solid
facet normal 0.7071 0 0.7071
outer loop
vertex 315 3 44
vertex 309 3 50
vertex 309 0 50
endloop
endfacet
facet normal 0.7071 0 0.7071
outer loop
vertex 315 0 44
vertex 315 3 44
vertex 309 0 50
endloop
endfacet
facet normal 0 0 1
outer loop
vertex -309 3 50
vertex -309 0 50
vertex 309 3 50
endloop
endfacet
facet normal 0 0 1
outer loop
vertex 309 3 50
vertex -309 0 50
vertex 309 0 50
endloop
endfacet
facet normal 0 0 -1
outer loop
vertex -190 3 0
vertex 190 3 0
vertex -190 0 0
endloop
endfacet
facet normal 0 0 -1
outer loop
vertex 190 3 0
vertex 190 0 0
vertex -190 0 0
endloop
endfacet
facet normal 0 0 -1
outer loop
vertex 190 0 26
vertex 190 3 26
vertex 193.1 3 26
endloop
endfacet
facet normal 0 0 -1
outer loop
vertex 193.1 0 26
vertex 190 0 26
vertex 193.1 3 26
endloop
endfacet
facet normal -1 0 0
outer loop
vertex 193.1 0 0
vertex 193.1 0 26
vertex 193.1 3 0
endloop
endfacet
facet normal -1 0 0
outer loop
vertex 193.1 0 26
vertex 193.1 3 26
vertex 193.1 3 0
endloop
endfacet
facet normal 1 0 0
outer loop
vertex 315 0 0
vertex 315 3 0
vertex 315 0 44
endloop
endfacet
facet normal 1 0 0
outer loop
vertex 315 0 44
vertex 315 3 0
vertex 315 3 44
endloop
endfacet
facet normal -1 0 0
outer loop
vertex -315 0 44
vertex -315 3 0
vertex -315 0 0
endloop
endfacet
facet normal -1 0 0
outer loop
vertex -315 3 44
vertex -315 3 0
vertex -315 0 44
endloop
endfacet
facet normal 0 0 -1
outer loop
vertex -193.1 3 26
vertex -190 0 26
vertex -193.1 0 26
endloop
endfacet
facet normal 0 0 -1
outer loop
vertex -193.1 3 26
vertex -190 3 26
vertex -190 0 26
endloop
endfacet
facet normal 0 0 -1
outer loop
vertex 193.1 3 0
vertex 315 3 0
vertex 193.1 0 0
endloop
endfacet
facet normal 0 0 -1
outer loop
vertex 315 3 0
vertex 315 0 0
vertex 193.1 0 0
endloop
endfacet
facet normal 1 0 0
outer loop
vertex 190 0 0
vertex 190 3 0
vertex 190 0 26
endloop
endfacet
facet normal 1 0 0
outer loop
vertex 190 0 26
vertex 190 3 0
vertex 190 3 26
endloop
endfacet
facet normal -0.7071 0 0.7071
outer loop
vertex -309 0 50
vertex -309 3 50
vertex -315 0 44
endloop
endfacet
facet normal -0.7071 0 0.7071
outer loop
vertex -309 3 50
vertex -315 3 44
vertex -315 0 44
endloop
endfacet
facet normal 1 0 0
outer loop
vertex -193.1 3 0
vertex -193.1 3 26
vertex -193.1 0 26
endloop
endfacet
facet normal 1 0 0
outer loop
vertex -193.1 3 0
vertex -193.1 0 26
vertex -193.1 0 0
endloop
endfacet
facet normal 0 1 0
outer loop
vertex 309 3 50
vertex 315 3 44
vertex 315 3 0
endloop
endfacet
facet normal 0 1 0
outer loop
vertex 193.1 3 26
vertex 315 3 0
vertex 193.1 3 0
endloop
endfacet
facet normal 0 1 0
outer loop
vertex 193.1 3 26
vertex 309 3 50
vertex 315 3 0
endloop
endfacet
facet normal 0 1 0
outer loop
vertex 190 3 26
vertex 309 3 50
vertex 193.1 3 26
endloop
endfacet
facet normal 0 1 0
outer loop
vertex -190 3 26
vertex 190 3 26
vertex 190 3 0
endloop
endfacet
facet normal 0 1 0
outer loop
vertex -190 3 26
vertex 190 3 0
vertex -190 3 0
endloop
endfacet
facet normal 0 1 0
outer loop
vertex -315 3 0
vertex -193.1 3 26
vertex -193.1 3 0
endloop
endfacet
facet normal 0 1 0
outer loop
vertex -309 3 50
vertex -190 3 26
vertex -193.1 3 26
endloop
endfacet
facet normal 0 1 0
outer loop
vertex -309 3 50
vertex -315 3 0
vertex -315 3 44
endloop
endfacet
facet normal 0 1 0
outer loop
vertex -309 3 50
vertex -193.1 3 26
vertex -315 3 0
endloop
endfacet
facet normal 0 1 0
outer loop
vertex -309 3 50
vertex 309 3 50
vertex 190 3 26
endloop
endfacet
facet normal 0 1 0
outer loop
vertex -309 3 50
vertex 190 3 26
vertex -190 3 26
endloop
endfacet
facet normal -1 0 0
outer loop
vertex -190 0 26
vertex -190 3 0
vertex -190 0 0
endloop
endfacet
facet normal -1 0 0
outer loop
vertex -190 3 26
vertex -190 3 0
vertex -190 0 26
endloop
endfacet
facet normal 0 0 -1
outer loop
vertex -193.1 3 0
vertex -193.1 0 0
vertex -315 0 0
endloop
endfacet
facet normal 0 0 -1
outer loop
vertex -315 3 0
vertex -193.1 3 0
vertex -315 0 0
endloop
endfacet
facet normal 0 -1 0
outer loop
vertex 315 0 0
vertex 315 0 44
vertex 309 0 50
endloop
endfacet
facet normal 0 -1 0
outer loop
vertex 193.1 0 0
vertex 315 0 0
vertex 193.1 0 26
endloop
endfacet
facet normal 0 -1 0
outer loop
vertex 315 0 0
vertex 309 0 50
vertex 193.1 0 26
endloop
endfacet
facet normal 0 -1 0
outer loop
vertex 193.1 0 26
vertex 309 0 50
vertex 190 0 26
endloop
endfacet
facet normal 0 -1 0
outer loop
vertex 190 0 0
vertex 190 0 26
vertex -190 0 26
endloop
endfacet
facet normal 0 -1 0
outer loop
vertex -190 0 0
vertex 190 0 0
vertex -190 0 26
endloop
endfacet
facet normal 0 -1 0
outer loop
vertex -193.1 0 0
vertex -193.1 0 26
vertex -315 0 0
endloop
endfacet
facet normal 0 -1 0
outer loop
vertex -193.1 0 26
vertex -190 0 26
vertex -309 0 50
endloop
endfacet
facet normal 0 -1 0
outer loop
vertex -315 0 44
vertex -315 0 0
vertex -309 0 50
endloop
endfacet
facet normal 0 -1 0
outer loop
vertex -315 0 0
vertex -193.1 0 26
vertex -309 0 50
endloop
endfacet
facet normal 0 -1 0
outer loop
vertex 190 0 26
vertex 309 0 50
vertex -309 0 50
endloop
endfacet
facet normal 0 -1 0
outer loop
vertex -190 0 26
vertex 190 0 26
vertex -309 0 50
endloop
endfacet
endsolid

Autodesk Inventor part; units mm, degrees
ref_plane "YZ Plane" through (0, 0, 0) normal (1, 0, 0) x (0, 1, 0)
ref_plane "XZ Plane" through (0, 0, 0) normal (0, 1, 0) x (-1, 0, 0)
ref_plane "XY Plane" through (0, 0, 0) normal (0, 0, 1) x (1, 0, 0)
sketch "Sketch2" plane through (0, 0, 0) normal (0, 1, 0) x (-1, 0, 0)
  line L0 (375, 50) -> (-375, 50)
  line L1 (-375, 50) -> (-375, 0)
  line L2 (-375, 0) -> (375, 0)
  line L3 (375, 0) -> (375, 50)
  circle A0 centre (-375, 0) radius 22.5
  circle A1 centre (375, 0) radius 22.5
  point P0 (0, 0)
  point P1 (0, 0)
  point P2 (-375, 22.5)
  point P3 (-352.5, 0)
  point P4 (352.5, 0)
  point P5 (375, 22.5)
  dimension "d18" = 750
  dimension "d19" = 50
  dimension "d20" = 45
extrude "Plate2" add sketch "Sketch2" along normal blind 3 contours L3 A1 L2 A0 L1 L0 | L3 L2 A1 | A0 L2 L1 picked at (360.188, 1.6689) picked at (-360.9308, 4.923)
sketch "Sketch3" plane through (0, 3, 0) normal (0, 1, 0) x (1, 0, 0)
  line L0 (-191.55, 0) -> (-191.55, -50) construction
  line L1 (-375, -50) -> (375, -50) construction
  line L2 (-375, -50) -> (-375, 0) projected
  line L3 (-193.1, 0) -> (-190, 0)
  line L4 (-190, 0) -> (-190, -26)
  line L5 (-190, -26) -> (-193.1, -26)
  line L6 (-193.1, -26) -> (-193.1, 0)
  line L7 (-375, 0) -> (375, 0) projected
  line L8 (375, 0) -> (-375, 0) projected
  line L9 (191.55, 0) -> (191.55, -50) construction
  line L10 (190, -26) -> (193.1, -26)
  line L11 (193.1, -26) -> (193.1, 0)
  line L12 (193.1, 0) -> (190, 0)
  line L13 (190, 0) -> (190, -26)
  line L14 (0, 0) -> (0, -50) construction
  point P0 (0, 0)
  point P1 (0, 0)
  point P2 (190, 0)
  point P3 (193.1, 0)
  dimension "d24" = 26
  dimension "d44" = 3.1
  dimension "d45" = 380
extrude "Extrusion1" cut sketch "Sketch3" against normal through all
sketch "Sketch4" plane through (0, 3, 0) normal (0, 1, 0) x (1, 0, 0)
  line L0 (-190, 0) -> (-190, -26) projected
  line L1 (-190, -26) -> (-193.1, -26) projected
  line L2 (-193.1, -26) -> (-193.1, 0) projected
  line L3 (-375, 0) -> (-193.1, 0) projected
  line L4 (-375, -50) -> (-375, 0) projected
  line L5 (375, -50) -> (-375, -50) projected
  line L6 (375, 0) -> (375, -50) projected
  line L7 (193.1, 0) -> (375, 0) projected
  line L8 (190, -26) -> (190, 0) projected
  line L9 (193.1, -26) -> (190, -26) projected
  line L10 (193.1, 0) -> (193.1, -26) projected
  line L11 (-190, 0) -> (190, 0) projected
  line L12 (-193.1, 0) -> (-375, 0) projected
  line L13 (-315, 0) -> (-315, -50)
  line L14 (315, 0) -> (315, -50)
  line L15 (-375, -50) -> (375, -50) projected
  point P0 (0, 0)
  dimension "d35" = 60
  dimension "d36" = 60
extrude "Extrusion2" cut sketch "Sketch4" against normal through all contours L13 L5 L4 L3 | L7 L6 L5 L14
sketch "Sketch5" plane through (0, 0, 0) normal (0, -1, 0) x (1, 0, 0)
  line L0 (-57.747, 1.3029) -> (-57.747, 31.8939) construction
  line L1 (-57.747, 31.8939) -> (64.2813, 31.8939) construction
  line L2 (64.2813, 31.8939) -> (64.2813, 1.3029) construction
  line L3 (64.2813, 1.3029) -> (-57.747, 1.3029) construction
  point P0 (0, 0)
mark "Mark1"
chamfer "Corner Chamfer1" distance 6 angle 45 2 edges at (-315, 1.5, 50) (315, 1.5, 50)
equation "\"d36\" = d35"
equation "\"d21\" = Thickness"
equation "\"BendReliefWidth\" = Thickness"
equation "\"BendReliefDepth\" = 0.5 * Thickness"
equation "\"CornerReliefSize\" = 4 * Thickness"
equation "\"MinimumRemnant\" = 2 * Thickness"
equation "\"TransitionRadius\" = BendRadius"
equation "\"JacobiRadiusSize\" = BendRadius"
equation "\"GapSize\" = Thickness"
equation "\"Thickness\" = 3"
equation "\"BendRadius\" = 5"
properties part number "MSC 107 RIB CONE" material "Stainless Steel"
